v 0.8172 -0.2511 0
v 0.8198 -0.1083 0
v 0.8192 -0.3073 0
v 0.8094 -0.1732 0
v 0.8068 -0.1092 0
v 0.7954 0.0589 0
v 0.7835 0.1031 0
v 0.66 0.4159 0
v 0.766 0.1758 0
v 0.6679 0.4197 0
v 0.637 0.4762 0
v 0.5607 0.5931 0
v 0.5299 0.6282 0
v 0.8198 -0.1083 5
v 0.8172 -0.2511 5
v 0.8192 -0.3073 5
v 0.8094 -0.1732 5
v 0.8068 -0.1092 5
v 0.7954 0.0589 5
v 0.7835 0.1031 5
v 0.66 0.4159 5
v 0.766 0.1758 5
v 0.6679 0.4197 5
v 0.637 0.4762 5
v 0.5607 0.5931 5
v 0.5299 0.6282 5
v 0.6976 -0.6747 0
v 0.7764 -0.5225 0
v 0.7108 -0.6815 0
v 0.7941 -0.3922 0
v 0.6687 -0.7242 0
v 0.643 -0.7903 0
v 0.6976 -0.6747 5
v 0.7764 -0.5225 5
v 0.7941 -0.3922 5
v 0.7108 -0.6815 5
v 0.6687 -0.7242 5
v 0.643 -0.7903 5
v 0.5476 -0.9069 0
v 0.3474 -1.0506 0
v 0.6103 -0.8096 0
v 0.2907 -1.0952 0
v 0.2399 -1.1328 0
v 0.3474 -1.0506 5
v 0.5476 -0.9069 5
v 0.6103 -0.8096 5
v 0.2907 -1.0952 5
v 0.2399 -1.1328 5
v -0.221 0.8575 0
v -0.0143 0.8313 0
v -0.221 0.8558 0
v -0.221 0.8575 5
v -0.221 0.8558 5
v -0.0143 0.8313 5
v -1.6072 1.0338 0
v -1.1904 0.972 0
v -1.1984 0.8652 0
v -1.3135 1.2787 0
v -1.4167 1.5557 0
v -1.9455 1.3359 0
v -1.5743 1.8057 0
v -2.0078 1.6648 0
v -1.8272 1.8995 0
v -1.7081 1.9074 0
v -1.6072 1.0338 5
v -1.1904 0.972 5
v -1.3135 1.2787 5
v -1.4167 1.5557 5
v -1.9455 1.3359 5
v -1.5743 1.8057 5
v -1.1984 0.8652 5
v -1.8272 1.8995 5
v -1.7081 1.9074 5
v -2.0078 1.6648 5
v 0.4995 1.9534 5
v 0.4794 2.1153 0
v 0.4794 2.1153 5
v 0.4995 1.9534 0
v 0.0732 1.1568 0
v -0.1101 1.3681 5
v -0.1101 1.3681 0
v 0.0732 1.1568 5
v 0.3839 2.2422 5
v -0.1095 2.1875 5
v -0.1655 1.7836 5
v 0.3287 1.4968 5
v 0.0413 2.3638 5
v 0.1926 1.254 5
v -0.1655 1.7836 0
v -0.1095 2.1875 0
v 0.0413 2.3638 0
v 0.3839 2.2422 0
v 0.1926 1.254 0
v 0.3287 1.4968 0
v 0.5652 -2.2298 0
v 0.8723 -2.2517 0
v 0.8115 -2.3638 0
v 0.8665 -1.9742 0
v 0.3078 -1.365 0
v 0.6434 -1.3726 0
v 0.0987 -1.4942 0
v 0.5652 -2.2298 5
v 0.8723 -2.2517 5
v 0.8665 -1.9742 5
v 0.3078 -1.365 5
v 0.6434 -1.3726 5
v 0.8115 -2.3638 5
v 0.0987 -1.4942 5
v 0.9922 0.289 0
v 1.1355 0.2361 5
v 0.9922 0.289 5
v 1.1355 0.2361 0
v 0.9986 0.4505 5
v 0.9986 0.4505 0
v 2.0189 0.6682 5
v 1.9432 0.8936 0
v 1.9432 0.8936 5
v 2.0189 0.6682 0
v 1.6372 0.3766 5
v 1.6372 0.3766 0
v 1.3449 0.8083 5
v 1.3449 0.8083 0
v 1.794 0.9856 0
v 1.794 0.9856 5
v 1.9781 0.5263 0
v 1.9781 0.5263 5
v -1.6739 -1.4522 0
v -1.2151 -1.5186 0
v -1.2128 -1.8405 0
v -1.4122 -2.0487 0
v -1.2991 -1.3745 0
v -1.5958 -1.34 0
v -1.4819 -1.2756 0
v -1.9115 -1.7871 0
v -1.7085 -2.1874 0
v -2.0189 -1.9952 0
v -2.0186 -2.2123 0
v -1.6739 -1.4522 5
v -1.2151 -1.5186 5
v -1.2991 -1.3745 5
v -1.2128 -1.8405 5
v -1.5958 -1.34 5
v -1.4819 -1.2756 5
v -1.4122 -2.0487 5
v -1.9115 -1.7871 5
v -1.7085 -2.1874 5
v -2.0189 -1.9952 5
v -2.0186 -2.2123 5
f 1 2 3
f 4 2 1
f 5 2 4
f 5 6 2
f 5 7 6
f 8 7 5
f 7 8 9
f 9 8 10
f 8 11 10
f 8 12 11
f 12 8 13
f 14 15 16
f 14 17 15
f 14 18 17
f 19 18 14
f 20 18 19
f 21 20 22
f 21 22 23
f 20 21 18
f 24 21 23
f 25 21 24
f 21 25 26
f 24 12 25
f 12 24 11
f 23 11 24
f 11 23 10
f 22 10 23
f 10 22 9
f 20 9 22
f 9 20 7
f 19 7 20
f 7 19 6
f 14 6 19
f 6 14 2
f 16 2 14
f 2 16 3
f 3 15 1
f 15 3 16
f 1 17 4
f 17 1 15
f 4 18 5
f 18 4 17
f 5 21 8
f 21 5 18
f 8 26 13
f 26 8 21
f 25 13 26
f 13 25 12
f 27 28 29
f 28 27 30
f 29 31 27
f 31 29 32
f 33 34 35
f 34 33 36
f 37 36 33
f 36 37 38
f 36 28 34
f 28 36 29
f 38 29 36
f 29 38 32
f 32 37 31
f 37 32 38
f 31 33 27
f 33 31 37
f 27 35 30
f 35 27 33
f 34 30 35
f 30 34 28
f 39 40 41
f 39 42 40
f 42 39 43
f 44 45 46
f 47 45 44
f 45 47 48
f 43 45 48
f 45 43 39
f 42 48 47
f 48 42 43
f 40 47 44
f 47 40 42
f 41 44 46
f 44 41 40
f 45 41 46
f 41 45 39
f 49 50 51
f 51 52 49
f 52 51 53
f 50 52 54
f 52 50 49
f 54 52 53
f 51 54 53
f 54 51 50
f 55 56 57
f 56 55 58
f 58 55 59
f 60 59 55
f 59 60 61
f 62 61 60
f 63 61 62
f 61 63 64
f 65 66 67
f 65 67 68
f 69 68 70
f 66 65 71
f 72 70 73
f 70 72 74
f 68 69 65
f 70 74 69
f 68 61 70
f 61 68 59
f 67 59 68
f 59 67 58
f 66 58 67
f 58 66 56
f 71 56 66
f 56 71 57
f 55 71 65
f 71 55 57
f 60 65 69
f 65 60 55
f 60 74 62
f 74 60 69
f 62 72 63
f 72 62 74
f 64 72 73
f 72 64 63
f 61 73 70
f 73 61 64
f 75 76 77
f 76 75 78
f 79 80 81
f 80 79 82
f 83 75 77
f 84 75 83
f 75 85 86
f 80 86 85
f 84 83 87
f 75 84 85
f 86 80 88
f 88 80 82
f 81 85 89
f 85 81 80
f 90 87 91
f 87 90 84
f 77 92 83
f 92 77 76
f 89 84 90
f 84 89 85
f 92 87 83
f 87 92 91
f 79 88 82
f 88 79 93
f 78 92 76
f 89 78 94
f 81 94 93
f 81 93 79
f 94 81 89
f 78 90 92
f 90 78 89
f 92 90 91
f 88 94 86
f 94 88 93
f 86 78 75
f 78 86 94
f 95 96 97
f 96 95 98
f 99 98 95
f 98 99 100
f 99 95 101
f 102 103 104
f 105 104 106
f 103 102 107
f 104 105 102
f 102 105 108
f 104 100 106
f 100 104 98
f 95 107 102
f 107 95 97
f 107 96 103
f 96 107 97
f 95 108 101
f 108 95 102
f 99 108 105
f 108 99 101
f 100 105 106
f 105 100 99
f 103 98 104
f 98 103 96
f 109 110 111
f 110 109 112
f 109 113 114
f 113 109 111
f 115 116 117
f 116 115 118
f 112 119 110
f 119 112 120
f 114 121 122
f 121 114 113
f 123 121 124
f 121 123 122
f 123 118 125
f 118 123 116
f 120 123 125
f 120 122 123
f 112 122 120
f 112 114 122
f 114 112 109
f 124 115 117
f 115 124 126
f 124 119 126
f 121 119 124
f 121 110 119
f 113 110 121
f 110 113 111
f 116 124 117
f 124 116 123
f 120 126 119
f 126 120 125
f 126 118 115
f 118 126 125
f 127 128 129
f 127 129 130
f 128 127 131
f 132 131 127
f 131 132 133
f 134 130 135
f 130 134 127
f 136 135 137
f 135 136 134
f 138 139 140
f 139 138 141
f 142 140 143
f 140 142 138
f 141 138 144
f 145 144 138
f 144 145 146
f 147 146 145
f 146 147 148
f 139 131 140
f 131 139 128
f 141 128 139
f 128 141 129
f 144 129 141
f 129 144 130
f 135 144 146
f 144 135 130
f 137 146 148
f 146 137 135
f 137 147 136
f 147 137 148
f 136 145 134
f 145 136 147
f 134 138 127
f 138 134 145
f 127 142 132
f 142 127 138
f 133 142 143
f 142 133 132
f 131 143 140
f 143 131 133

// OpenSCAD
// Module names are of the form poly_<inkscape-path-id>().  As a result,
// you can associate a polygon in this OpenSCAD program with the corresponding
// SVG element in the Inkscape document by looking for the XML element with
// the attribute id="inkscape-path-id".

// fudge value is used to ensure that subtracted solids are a tad taller
// in the z dimension than the polygon being subtracted from.  This helps
// keep the resulting .stl file manifold.
fudge = 0.1;

module poly_path410(h)
{
  scale([25.4/90, -25.4/90, 1]) union()
  {
    linear_extrude(height=h)
      polygon([[-0.679877,-3.708430],[-1.132985,-3.551147],[-0.983065,-3.537761],[-0.797003,-3.523037],[-0.060117,-3.634808],[-0.014605,-3.639493],[-0.062125,-3.626107],[-0.701294,-3.515675],[-0.552043,-3.504966],[-0.074841,-3.541777],[-0.019290,-3.543115],[-0.076180,-3.534415],[-0.419524,-3.495596],[1.185427,-3.264692],[-0.096928,-3.399219],[-0.397438,-3.393864],[0.555377,-3.191070],[1.416332,-2.705167],[1.735582,-2.399972],[1.743613,-2.407334],[1.416332,-2.705167],[1.730897,-2.395287],[1.724873,-2.389264],[1.740936,-2.372531],[1.813888,-2.295563],[2.502920,-1.074030],[2.848607,0.485327],[2.273020,-1.137026],[1.375505,-2.213910],[1.390899,-2.229304],[1.374836,-2.246036],[0.008820,-3.017055],[-0.761530,-3.135519],[-0.140431,-3.074614],[-0.117676,-3.070598],[-0.109644,-3.116779],[-0.132400,-3.120795],[-0.475075,-3.170992],[-0.473067,-3.217842],[-0.483776,-3.217842],[-0.483107,-3.251306],[-0.506532,-3.251975],[-1.364559,-3.189732],[-1.644321,-3.144220],[-3.108722,-2.575995],[-3.172974,-2.537176],[-4.255212,-1.446907],[-4.366314,-1.207971],[-4.269267,-1.622929],[-3.371752,-2.835678],[-3.332264,-2.778789],[-3.369744,-2.730600],[-4.077181,-1.767495],[-2.878487,-2.834340],[-2.470222,-3.057882],[-2.513725,-3.015048],[-2.320301,-3.094693],[-1.946169,-3.274731],[-1.991681,-3.297487],[-1.805619,-3.472840],[-1.211292,-3.555832]]);
    linear_extrude(height=h)
      polygon([[1.877471,-2.225957],[2.338610,-1.473678],[2.858646,0.386942],[2.868016,0.613830],[2.895457,0.889577],[2.902819,1.089024],[2.904827,0.383595],[2.818489,-0.208724],[2.776324,-0.365338],[2.714080,-0.623014],[2.366720,-1.487064],[2.256957,-1.687181],[1.986565,-2.101470]]);
    linear_extrude(height=h)
      polygon([[2.813804,1.389534],[2.471798,2.390789],[2.369397,2.566142],[2.278374,2.800393],[2.518648,2.414883],[2.750891,1.851343]]);
    linear_extrude(height=h)
      polygon([[2.162587,2.868660],[1.230939,3.722671],[1.030153,3.880623],[0.850114,4.013811],[1.940384,3.213343]]);
    linear_extrude(height=h)
      polygon([[1.256372,3.701254],[2.196052,2.805747],[2.345972,2.472442],[2.360696,2.434292],[2.529357,1.804493],[2.570183,1.215520],[2.570183,1.192764],[2.614356,1.190087],[2.617034,1.212173],[2.575538,1.813193],[2.463097,2.281695],[2.405539,2.449686],[2.393492,2.489174],[2.384122,2.519961],[2.819158,1.239614],[2.780340,0.618515],[2.208099,-1.101554],[1.748968,-1.763480],[1.576291,-1.928794],[1.324639,-2.191154],[1.218222,-2.308949],[1.279797,-2.271469],[1.220230,-2.325681],[1.197475,-2.297571],[1.162002,-2.327020],[-0.015944,-2.888552],[-0.665822,-2.980914],[-0.665822,-2.978906],[-0.146455,-2.910639],[-0.123699,-2.905954],[-0.133069,-2.859773],[-0.155825,-2.864458],[-1.579400,-2.870481],[-2.941400,-2.384579],[-3.031754,-2.329028],[-4.022300,-1.326435],[-4.298548,-0.132091],[-4.379030,1.124496],[-4.593871,2.001933],[-4.743123,2.290396],[-5.135325,2.722755],[-5.754416,3.029289],[-5.851463,3.084840],[-5.915714,3.177202],[-5.933785,3.286965],[-5.902329,3.394720],[-5.869534,3.449602],[-5.350836,3.807001],[-5.123278,3.924796],[-3.387146,4.468258],[-1.758853,4.617592],[-0.193305,4.412037],[0.690155,3.990386],[1.560145,3.305036],[2.118414,2.354647],[2.126446,2.331891],[2.273020,1.628470],[2.236209,0.829341],[2.232863,0.806585],[2.278374,0.799223],[2.282390,0.821978],[2.319870,1.633155],[2.306484,1.759650],[2.171288,2.345277],[2.165934,2.368702],[2.127115,2.509922],[2.149202,2.520630],[2.139832,2.541378],[1.975187,2.865314],[1.509363,3.454956]]);
    linear_extrude(height=h)
      polygon([[-0.782948,-3.038473],[-0.050747,-2.945442],[-0.782948,-3.032449]]);
  }
}

module poly_path418(h)
{
  scale([25.4/90, -25.4/90, 1]) union()
  {
    linear_extrude(height=h)
      polygon([[-6.893477,-4.733644],[-5.694950,-3.663035],[-4.246444,-3.065780],[-4.218083,-3.444178],[-4.654040,-4.530850],[-5.019806,-5.512193],[-5.578326,-6.398163],[-6.052307,-6.758459],[-6.474335,-6.730548],[-7.114341,-5.898874]]);
  }
}

module poly_path430(h)
{
  scale([25.4/90, -25.4/90, 1]) union()
  {
    linear_extrude(height=h)
      polygon([[0.259468,-4.099026],[0.682604,-4.443364],[1.164846,-5.303660],[1.770050,-6.921412],[1.698562,-7.495012],[1.360278,-7.944753],[0.146358,-8.375774],[-0.388162,-7.750921],[-0.586428,-6.319973],[-0.390024,-4.847739]]);
  }
}

module poly_path374(h)
{
  scale([25.4/90, -25.4/90, 1]) union()
  {
    linear_extrude(height=h)
      polygon([[3.070274,6.995086],[2.279845,4.863405],[1.090605,4.836466],[0.349620,5.294426],[2.002593,7.900883],[2.875574,8.375774],[3.090956,7.978472]]);
  }
}

module poly_path362(h)
{
  scale([25.4/90, -25.4/90, 1]) union()
  {
    linear_extrude(height=h)
      polygon([[6.885349,-3.166307],[6.356611,-3.492250],[4.765464,-2.863956],[3.538241,-1.596158],[3.515820,-1.024084],[4.023475,-0.836517],[5.801103,-1.334467],[7.009083,-1.864877],[7.153681,-2.367700]]);
  }
}

module poly_path422(h)
{
  scale([25.4/90, -25.4/90, 1]) union()
  {
    linear_extrude(height=h)
      polygon([[-4.297245,6.521565],[-4.305527,5.380848],[-4.603036,4.870443],[-5.250980,4.519726],[-5.654476,4.748036],[-5.930976,5.145510],[-6.772940,6.332157],[-7.153681,7.069628],[-7.152426,7.838723],[-6.053623,7.750461],[-5.004012,7.259120]]);
  }
}

module poly_path370(h)
{
  scale([25.4/90, -25.4/90, 1]) union()
  {
    linear_extrude(height=h)
      polygon([[-4.297245,6.521565],[-4.305527,5.380848],[-4.603036,4.870443],[-5.250980,4.519726],[-5.654476,4.748036],[-5.930976,5.145510],[-6.772940,6.332157],[-7.153681,7.069628],[-7.152426,7.838723],[-6.053623,7.750461],[-5.004012,7.259120]]);
  }
}

module poly_path426(h)
{
  scale([25.4/90, -25.4/90, 1]) union()
  {
    linear_extrude(height=h)
      polygon([[3.070274,6.995086],[2.279845,4.863405],[1.090605,4.836466],[0.349620,5.294426],[2.002593,7.900883],[2.875574,8.375774],[3.090956,7.978472]]);
  }
}

module poly_path414(h)
{
  scale([25.4/90, -25.4/90, 1]) union()
  {
    linear_extrude(height=h)
      polygon([[6.885349,-3.166307],[6.356611,-3.492250],[4.765464,-2.863956],[3.538241,-1.596158],[3.515820,-1.024084],[4.023475,-0.836517],[5.801103,-1.334467],[7.009083,-1.864877],[7.153681,-2.367700]]);
  }
}

module poly_path378(h)
{
  scale([25.4/90, -25.4/90, 1]) union()
  {
    linear_extrude(height=h)
      polygon([[0.259468,-4.099026],[0.682604,-4.443364],[1.164846,-5.303660],[1.770050,-6.921412],[1.698562,-7.495012],[1.360278,-7.944753],[0.146358,-8.375774],[-0.388162,-7.750921],[-0.586428,-6.319973],[-0.390024,-4.847739]]);
  }
}

module poly_path366(h)
{
  scale([25.4/90, -25.4/90, 1]) union()
  {
    linear_extrude(height=h)
      polygon([[-6.893477,-4.733644],[-5.694950,-3.663035],[-4.246444,-3.065780],[-4.218083,-3.444178],[-4.654040,-4.530850],[-5.019806,-5.512193],[-5.578326,-6.398163],[-6.052307,-6.758459],[-6.474335,-6.730548],[-7.114341,-5.898874]]);
  }
}

module poly_path358(h)
{
  scale([25.4/90, -25.4/90, 1]) union()
  {
    linear_extrude(height=h)
      polygon([[-0.679877,-3.708430],[-1.132985,-3.551147],[-0.983065,-3.537761],[-0.797003,-3.523037],[-0.060117,-3.634808],[-0.014605,-3.639493],[-0.062125,-3.626107],[-0.701294,-3.515675],[-0.552043,-3.504966],[-0.074841,-3.541777],[-0.019290,-3.543115],[-0.076180,-3.534415],[-0.419524,-3.495596],[1.185427,-3.264692],[-0.096928,-3.399219],[-0.397438,-3.393864],[0.555377,-3.191070],[1.416332,-2.705167],[1.735582,-2.399972],[1.743613,-2.407334],[1.416332,-2.705167],[1.730897,-2.395287],[1.724873,-2.389264],[1.740936,-2.372531],[1.813888,-2.295563],[2.502920,-1.074030],[2.848607,0.485327],[2.273020,-1.137026],[1.375505,-2.213910],[1.390899,-2.229304],[1.374836,-2.246036],[0.008820,-3.017055],[-0.761530,-3.135519],[-0.140431,-3.074614],[-0.117676,-3.070598],[-0.109644,-3.116779],[-0.132400,-3.120795],[-0.475075,-3.170992],[-0.473067,-3.217842],[-0.483776,-3.217842],[-0.483107,-3.251306],[-0.506532,-3.251975],[-1.364559,-3.189732],[-1.644321,-3.144220],[-3.108722,-2.575995],[-3.172974,-2.537176],[-4.255212,-1.446907],[-4.366314,-1.207971],[-4.269267,-1.622929],[-3.371752,-2.835678],[-3.332264,-2.778789],[-3.369744,-2.730600],[-4.077181,-1.767495],[-2.878487,-2.834340],[-2.470222,-3.057882],[-2.513725,-3.015048],[-2.320301,-3.094693],[-1.946169,-3.274731],[-1.991681,-3.297487],[-1.805619,-3.472840],[-1.211292,-3.555832]]);
    linear_extrude(height=h)
      polygon([[1.877471,-2.225957],[2.338610,-1.473678],[2.858646,0.386942],[2.868016,0.613830],[2.895457,0.889577],[2.902819,1.089024],[2.904827,0.383595],[2.818489,-0.208724],[2.776324,-0.365338],[2.714080,-0.623014],[2.366720,-1.487064],[2.256957,-1.687181],[1.986565,-2.101470]]);
    linear_extrude(height=h)
      polygon([[2.813804,1.389534],[2.471798,2.390789],[2.369397,2.566142],[2.278374,2.800393],[2.518648,2.414883],[2.750891,1.851343]]);
    linear_extrude(height=h)
      polygon([[2.162587,2.868660],[1.230939,3.722671],[1.030153,3.880623],[0.850114,4.013811],[1.940384,3.213343]]);
    linear_extrude(height=h)
      polygon([[1.256372,3.701254],[2.196052,2.805747],[2.345972,2.472442],[2.360696,2.434292],[2.529357,1.804493],[2.570183,1.215520],[2.570183,1.192764],[2.614356,1.190087],[2.617034,1.212173],[2.575538,1.813193],[2.463097,2.281695],[2.405539,2.449686],[2.393492,2.489174],[2.384122,2.519961],[2.819158,1.239614],[2.780340,0.618515],[2.208099,-1.101554],[1.748968,-1.763480],[1.576291,-1.928794],[1.324639,-2.191154],[1.218222,-2.308949],[1.279797,-2.271469],[1.220230,-2.325681],[1.197475,-2.297571],[1.162002,-2.327020],[-0.015944,-2.888552],[-0.665822,-2.980914],[-0.665822,-2.978906],[-0.146455,-2.910639],[-0.123699,-2.905954],[-0.133069,-2.859773],[-0.155825,-2.864458],[-1.579400,-2.870481],[-2.941400,-2.384579],[-3.031754,-2.329028],[-4.022300,-1.326435],[-4.298548,-0.132091],[-4.379030,1.124496],[-4.593871,2.001933],[-4.743123,2.290396],[-5.135325,2.722755],[-5.754416,3.029289],[-5.851463,3.084840],[-5.915714,3.177202],[-5.933785,3.286965],[-5.902329,3.394720],[-5.869534,3.449602],[-5.350836,3.807001],[-5.123278,3.924796],[-3.387146,4.468258],[-1.758853,4.617592],[-0.193305,4.412037],[0.690155,3.990386],[1.560145,3.305036],[2.118414,2.354647],[2.126446,2.331891],[2.273020,1.628470],[2.236209,0.829341],[2.232863,0.806585],[2.278374,0.799223],[2.282390,0.821978],[2.319870,1.633155],[2.306484,1.759650],[2.171288,2.345277],[2.165934,2.368702],[2.127115,2.509922],[2.149202,2.520630],[2.139832,2.541378],[1.975187,2.865314],[1.509363,3.454956]]);
    linear_extrude(height=h)
      polygon([[-0.782948,-3.038473],[-0.050747,-2.945442],[-0.782948,-3.032449]]);
  }
}

poly_path410(5);
poly_path418(5);
poly_path430(5);
poly_path374(5);
poly_path362(5);
poly_path422(5);
poly_path370(5);
poly_path426(5);
poly_path414(5);
poly_path378(5);
poly_path366(5);
poly_path358(5);
